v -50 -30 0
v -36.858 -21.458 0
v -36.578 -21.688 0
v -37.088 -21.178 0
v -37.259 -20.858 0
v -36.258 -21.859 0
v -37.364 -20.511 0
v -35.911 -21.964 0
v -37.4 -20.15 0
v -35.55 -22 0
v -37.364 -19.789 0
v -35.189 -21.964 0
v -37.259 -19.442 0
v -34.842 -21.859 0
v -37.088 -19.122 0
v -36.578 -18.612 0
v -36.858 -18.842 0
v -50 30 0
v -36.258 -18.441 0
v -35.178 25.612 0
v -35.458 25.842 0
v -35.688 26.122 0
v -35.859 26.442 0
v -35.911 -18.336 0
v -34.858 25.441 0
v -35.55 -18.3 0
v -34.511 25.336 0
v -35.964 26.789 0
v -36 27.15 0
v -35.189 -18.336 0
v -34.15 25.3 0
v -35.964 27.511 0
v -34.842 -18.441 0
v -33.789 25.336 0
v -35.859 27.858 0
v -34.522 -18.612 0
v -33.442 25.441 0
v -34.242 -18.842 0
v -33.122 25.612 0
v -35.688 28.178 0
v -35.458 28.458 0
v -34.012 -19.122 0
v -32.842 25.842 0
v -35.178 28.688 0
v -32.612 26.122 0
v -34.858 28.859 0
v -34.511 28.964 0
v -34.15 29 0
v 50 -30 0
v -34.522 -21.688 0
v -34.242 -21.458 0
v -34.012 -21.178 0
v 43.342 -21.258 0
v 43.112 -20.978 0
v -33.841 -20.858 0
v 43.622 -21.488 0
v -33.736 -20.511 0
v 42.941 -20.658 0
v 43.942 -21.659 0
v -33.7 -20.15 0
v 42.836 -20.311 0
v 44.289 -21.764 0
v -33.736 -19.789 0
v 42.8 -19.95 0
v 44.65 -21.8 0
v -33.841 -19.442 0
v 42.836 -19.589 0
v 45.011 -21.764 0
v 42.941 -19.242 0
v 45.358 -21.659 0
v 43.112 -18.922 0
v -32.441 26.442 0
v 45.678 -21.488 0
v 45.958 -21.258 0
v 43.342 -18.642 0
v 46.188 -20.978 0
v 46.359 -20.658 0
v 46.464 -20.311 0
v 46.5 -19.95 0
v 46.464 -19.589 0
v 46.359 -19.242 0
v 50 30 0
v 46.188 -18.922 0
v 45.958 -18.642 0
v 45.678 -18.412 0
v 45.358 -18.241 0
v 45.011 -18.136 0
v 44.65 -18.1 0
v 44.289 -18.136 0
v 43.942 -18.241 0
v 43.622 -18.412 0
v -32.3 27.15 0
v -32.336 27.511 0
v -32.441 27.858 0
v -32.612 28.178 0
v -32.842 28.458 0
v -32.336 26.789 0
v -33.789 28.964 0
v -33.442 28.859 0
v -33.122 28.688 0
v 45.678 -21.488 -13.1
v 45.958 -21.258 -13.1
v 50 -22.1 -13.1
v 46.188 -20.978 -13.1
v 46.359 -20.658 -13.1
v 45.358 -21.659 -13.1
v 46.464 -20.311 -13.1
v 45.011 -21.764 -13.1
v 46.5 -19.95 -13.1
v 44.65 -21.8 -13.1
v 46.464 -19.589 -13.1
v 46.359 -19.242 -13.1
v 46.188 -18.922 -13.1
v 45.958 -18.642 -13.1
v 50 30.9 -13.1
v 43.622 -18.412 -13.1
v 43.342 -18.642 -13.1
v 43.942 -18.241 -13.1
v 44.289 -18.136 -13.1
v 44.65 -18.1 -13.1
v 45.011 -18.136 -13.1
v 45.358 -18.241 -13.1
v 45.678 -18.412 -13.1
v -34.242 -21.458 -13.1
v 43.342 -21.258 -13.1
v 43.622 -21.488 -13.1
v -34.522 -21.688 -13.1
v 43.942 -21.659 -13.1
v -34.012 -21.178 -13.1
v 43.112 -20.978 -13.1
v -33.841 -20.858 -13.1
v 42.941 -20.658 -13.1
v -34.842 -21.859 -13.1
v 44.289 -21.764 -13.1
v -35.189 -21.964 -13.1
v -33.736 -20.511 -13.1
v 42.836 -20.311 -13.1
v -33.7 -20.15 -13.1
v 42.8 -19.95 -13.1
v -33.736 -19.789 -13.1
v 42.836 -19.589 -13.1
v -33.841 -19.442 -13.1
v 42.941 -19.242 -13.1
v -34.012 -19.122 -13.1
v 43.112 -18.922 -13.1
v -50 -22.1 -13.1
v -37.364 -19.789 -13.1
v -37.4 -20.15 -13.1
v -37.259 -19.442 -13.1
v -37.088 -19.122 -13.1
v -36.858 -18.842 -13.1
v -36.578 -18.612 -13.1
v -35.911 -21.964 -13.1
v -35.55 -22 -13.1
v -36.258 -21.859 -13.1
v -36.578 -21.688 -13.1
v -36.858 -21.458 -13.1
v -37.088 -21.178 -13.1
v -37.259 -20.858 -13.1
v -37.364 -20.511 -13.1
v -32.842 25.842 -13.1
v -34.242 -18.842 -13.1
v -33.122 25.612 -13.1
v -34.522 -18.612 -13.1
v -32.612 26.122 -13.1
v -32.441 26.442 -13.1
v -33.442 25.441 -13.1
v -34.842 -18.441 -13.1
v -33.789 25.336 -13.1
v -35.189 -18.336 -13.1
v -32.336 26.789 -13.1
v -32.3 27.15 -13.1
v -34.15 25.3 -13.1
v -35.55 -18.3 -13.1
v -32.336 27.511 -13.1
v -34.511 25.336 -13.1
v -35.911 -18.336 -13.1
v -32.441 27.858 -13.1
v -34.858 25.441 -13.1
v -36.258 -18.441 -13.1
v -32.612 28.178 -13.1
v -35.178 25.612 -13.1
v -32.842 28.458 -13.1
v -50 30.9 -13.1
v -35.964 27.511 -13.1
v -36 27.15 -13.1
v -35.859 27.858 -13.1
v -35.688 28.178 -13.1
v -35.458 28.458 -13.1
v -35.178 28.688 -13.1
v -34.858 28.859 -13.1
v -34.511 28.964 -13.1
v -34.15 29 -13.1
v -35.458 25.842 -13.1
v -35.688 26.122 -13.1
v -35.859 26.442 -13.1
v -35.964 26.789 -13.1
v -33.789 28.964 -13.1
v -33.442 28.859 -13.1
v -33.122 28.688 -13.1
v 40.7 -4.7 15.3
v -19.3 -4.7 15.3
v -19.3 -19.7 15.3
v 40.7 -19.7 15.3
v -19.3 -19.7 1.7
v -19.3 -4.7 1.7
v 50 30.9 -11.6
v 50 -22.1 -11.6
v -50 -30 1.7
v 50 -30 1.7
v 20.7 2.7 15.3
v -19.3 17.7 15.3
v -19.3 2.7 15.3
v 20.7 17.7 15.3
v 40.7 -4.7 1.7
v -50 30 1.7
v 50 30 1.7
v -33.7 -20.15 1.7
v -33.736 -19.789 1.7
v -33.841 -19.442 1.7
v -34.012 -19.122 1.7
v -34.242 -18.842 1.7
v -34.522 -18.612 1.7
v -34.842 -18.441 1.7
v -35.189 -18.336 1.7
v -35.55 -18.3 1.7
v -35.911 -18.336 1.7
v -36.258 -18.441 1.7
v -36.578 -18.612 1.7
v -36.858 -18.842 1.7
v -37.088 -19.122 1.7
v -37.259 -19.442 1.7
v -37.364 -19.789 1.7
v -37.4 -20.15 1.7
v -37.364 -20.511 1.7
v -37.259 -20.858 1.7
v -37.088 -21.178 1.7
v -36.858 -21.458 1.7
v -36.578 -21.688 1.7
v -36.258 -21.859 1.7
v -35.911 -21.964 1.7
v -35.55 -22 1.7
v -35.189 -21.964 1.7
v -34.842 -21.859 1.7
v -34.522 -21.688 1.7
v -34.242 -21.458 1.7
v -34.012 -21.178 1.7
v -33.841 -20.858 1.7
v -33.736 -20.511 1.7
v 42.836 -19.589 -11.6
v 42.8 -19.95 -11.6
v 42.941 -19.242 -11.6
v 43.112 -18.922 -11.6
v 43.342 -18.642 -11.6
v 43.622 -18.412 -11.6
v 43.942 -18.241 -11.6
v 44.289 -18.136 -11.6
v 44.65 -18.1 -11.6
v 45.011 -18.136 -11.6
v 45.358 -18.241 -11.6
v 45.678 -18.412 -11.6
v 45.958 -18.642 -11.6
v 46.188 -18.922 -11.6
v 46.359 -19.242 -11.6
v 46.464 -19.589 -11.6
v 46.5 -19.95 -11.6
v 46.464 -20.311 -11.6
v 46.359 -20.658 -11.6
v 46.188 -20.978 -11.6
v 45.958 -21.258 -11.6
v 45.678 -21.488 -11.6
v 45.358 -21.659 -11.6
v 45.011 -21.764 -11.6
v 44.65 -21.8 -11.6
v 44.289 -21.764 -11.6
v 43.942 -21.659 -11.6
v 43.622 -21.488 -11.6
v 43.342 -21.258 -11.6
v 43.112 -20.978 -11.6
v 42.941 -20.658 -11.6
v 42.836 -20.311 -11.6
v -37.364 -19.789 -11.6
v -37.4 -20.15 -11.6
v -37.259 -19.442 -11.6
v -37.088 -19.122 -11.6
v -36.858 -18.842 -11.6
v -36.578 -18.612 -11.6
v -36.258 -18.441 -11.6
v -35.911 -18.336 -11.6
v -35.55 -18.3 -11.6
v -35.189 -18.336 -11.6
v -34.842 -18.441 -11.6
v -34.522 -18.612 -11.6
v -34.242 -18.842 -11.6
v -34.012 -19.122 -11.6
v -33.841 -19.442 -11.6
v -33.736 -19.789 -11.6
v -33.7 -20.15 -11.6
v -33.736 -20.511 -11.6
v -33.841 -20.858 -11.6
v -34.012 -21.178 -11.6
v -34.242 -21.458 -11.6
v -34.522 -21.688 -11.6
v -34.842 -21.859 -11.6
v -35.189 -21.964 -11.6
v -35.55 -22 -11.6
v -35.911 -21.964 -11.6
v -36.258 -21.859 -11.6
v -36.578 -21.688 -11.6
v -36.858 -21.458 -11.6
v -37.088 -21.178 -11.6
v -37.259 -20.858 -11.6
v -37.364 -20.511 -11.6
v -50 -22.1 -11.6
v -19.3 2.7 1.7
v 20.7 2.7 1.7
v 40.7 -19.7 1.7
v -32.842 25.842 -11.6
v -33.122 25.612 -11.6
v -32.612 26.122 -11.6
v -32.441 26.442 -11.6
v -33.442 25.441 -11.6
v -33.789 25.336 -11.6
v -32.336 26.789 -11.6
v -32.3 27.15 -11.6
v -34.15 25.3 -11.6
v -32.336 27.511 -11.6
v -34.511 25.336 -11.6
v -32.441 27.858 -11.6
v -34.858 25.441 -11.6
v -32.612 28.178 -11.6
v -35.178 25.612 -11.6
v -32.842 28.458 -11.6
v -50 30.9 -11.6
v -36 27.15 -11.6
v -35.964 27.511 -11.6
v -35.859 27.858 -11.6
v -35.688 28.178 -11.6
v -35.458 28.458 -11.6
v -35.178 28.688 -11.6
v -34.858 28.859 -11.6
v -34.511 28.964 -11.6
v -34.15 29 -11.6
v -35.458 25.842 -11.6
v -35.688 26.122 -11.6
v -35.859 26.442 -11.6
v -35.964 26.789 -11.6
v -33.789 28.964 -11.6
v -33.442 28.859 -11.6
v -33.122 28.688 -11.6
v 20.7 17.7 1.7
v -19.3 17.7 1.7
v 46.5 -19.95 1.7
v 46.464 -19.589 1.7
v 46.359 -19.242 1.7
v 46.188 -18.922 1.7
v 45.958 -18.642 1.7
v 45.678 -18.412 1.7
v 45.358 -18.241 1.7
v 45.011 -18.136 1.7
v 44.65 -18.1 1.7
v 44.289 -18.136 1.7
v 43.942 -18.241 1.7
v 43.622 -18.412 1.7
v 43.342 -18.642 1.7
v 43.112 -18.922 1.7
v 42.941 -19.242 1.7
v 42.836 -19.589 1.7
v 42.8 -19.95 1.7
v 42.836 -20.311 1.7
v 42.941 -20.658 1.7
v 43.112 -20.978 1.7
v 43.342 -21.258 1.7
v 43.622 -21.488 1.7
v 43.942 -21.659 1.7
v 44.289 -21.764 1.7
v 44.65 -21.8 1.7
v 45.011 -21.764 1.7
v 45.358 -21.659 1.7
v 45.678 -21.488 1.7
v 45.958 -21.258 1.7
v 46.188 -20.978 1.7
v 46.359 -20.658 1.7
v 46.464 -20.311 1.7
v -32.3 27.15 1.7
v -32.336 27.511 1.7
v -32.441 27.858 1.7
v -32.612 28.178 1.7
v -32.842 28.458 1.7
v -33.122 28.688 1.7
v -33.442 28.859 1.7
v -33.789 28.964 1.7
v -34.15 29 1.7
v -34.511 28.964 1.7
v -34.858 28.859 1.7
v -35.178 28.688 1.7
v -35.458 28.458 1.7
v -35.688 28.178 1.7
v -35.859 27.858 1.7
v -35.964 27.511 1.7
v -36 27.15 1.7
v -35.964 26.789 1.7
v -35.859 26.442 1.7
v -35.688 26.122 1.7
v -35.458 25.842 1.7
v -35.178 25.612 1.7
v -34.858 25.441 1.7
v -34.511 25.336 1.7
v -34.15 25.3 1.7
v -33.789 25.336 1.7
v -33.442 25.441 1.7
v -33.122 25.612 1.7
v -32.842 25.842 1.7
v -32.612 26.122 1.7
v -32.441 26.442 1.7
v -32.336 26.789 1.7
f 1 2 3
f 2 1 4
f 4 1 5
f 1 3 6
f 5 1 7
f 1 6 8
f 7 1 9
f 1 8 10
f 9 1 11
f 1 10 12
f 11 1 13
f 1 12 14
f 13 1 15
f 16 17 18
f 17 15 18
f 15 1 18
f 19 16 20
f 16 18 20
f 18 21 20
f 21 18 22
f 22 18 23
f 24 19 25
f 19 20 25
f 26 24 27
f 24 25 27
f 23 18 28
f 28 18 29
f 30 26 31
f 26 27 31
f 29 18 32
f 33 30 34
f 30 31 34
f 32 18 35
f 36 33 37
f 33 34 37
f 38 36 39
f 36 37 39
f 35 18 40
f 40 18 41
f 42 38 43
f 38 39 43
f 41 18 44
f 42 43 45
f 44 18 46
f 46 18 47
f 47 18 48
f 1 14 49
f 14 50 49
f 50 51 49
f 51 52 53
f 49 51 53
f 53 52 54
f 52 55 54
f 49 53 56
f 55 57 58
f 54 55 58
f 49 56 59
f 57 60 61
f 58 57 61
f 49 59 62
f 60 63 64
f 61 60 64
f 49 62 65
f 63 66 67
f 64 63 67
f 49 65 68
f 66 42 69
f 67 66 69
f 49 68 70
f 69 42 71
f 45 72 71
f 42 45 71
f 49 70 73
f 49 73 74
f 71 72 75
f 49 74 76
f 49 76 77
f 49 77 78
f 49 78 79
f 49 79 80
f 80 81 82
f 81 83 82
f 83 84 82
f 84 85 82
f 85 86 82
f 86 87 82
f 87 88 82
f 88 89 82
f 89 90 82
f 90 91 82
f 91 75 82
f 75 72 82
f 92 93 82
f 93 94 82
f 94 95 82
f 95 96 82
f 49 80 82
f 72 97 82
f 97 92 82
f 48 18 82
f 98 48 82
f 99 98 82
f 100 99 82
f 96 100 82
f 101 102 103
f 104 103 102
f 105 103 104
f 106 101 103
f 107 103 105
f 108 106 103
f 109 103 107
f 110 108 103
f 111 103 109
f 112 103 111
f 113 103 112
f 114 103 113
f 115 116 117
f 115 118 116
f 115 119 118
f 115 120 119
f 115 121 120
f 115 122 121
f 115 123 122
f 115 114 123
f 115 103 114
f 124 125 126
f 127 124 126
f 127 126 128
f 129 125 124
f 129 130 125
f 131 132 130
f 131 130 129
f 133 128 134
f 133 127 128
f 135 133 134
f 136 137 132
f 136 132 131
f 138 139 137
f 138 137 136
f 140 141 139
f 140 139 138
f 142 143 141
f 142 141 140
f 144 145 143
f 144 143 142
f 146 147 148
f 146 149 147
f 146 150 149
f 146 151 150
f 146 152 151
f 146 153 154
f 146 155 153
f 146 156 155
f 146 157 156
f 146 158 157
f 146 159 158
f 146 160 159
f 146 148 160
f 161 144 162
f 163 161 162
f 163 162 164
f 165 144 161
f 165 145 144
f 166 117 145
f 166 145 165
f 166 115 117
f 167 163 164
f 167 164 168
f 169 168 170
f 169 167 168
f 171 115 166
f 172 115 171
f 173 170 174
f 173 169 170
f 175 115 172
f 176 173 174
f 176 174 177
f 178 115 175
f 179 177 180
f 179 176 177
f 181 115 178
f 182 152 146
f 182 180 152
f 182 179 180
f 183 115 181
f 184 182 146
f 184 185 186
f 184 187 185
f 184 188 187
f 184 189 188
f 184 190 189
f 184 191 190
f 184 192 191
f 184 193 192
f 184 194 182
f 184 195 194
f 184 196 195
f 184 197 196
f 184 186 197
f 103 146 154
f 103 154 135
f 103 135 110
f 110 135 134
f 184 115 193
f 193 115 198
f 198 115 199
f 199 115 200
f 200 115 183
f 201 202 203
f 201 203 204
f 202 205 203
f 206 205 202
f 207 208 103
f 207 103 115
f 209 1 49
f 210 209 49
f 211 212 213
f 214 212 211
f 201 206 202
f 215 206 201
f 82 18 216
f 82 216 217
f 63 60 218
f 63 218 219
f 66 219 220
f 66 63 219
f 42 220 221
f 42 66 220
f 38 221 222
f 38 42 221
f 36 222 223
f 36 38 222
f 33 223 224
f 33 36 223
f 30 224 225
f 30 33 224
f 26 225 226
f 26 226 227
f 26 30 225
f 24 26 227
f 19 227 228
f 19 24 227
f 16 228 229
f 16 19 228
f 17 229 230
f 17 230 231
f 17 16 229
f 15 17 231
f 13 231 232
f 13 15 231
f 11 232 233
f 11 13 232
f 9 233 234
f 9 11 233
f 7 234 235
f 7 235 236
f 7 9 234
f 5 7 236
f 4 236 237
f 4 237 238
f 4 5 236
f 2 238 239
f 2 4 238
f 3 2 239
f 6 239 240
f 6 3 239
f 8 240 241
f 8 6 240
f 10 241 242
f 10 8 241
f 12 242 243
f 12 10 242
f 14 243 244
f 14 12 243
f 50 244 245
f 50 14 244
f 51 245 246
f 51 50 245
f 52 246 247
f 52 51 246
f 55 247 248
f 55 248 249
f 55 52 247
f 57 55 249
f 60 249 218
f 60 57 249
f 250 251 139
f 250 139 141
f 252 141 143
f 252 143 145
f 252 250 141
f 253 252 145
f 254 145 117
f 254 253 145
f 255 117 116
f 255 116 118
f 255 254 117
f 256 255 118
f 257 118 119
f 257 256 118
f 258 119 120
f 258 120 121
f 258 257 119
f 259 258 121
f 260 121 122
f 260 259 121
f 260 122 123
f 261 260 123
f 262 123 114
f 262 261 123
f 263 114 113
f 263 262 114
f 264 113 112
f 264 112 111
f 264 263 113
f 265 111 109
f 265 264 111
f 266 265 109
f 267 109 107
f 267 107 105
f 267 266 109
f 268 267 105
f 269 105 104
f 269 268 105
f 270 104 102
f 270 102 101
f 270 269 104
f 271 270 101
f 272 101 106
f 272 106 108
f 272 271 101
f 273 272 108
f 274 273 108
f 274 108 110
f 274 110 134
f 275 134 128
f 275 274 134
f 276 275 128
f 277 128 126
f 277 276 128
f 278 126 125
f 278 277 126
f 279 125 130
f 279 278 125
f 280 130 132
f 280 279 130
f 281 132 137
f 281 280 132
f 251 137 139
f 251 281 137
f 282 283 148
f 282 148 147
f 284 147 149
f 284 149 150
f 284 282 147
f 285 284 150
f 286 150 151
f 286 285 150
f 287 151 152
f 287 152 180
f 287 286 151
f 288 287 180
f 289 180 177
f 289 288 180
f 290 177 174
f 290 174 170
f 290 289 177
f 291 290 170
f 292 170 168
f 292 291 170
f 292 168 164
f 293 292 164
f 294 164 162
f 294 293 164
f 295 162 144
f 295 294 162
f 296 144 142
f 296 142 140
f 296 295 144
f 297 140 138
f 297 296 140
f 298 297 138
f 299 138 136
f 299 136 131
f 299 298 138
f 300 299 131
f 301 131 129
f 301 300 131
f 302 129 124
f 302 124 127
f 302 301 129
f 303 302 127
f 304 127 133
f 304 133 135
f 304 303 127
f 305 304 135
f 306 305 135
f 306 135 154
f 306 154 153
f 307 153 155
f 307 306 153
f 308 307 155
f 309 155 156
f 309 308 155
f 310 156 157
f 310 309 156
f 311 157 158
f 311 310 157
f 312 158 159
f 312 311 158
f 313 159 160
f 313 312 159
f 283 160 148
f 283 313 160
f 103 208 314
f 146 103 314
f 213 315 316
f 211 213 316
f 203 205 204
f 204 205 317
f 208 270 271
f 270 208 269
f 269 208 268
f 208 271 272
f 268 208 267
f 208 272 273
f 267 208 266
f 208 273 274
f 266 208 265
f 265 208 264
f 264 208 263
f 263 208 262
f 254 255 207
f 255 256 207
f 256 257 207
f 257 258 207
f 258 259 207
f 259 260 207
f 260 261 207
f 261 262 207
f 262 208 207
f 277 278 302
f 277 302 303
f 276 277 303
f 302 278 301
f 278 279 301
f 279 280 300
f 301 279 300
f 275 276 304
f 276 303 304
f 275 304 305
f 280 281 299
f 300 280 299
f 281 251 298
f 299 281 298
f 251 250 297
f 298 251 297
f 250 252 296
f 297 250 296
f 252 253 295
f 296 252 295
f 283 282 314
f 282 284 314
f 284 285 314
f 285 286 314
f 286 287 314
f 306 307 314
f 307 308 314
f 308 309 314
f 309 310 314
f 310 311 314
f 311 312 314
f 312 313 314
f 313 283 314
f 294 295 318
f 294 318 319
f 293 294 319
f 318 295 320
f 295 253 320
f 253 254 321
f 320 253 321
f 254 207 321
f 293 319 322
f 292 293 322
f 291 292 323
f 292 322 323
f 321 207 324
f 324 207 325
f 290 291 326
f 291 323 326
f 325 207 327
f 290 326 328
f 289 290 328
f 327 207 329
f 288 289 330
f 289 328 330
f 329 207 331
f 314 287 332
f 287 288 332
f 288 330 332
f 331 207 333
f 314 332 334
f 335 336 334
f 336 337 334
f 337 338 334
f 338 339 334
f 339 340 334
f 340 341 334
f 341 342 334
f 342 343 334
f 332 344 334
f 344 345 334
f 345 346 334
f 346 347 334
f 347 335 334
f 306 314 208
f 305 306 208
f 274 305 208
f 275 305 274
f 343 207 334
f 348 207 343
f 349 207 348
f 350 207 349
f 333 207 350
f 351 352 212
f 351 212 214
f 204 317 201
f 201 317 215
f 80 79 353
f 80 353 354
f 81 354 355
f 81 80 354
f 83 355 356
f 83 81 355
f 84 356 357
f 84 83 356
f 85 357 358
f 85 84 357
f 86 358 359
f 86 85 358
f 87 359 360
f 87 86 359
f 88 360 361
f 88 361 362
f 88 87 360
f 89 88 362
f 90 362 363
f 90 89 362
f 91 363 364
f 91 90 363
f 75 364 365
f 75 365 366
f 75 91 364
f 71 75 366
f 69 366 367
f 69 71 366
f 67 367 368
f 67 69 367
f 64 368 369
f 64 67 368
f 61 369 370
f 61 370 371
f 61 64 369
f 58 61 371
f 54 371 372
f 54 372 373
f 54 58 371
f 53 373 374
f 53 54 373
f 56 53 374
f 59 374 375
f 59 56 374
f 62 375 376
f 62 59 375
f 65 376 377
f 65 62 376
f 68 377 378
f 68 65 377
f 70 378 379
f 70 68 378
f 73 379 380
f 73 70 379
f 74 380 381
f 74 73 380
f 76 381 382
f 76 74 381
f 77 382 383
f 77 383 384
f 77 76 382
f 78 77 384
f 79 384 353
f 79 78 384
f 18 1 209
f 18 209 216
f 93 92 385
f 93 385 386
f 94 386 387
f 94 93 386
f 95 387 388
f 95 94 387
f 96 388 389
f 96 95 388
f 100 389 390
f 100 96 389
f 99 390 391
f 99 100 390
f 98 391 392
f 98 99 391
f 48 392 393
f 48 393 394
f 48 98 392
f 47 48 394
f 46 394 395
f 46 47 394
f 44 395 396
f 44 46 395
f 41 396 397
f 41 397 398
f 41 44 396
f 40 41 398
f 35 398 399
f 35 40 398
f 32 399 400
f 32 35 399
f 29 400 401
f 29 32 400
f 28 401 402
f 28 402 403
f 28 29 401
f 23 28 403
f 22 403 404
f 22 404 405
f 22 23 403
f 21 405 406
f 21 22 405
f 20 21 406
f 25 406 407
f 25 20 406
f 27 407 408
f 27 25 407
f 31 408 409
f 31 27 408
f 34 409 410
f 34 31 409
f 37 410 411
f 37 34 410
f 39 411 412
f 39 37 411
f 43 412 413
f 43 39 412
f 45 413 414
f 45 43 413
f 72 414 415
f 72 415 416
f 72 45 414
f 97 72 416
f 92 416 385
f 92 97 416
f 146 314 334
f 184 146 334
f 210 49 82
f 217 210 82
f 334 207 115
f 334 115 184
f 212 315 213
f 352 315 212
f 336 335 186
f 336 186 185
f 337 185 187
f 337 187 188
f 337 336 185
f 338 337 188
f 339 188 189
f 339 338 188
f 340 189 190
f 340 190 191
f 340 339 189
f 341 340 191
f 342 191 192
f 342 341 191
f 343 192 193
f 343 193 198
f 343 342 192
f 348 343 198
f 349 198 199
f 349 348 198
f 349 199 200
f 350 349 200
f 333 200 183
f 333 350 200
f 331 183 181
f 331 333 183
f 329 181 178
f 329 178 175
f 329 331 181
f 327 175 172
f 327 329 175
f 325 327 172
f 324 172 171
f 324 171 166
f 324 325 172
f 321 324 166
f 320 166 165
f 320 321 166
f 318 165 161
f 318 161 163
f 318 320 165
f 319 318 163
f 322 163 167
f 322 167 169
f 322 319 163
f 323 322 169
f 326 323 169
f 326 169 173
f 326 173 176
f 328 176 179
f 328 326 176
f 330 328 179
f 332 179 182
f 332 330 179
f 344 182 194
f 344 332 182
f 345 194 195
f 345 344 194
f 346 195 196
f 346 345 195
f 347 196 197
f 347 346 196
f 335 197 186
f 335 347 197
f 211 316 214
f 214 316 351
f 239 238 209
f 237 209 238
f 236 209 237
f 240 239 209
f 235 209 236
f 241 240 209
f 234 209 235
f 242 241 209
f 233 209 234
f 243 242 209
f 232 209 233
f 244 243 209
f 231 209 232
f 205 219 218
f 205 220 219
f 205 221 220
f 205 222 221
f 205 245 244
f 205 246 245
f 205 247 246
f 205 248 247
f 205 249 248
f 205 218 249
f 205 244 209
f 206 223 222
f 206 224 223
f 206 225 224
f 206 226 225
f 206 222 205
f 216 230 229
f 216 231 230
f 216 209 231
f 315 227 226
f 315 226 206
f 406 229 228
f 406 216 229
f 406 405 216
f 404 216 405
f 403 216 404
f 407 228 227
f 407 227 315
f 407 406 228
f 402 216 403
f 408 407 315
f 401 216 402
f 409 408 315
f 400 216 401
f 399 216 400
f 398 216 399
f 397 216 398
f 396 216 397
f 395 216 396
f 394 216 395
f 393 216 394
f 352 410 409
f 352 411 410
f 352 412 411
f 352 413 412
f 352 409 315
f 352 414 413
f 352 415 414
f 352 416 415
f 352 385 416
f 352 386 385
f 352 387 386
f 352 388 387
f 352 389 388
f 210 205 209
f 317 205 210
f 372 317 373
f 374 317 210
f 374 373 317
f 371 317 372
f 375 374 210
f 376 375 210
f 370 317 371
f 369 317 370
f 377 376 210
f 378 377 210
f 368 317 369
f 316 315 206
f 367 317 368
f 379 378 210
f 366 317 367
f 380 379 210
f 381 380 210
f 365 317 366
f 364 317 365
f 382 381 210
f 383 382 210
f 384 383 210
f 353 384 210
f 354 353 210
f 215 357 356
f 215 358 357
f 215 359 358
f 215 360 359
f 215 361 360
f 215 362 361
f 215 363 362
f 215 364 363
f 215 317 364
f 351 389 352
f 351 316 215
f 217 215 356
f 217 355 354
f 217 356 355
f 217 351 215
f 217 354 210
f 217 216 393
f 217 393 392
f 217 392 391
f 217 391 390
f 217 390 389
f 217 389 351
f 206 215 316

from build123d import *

# Parameters (mm, degrees)
ESBO_O1_W                = 100
ESBO_O1_H                = 60
ESBO_O1_R                = 1.85
RESSALTO_EXTRUS_O1_DEPTH = 1.7
ESBO_O2_W                = 60
ESBO_O2_H                = 15
ESBO_O2_W_2              = 40
RESSALTO_EXTRUS_O2_DEPTH = 13.6
RESSALTO_EXTRUS_O6_START = 11.6
ESBO_O3_W                = 100
ESBO_O3_H                = 53
ESBO_O3_R                = 1.85
RESSALTO_EXTRUS_O6_DEPTH = 1.5


with BuildPart() as part:
    # Esboço1 → Ressalto-extrusão1 (new body)
    with BuildSketch(Plane.XY):
        Rectangle(ESBO_O1_W, ESBO_O1_H)
        with Locations((-34.15, 27.15)):
            Circle(ESBO_O1_R, mode=Mode.SUBTRACT)
        with Locations((-35.55, -20.15)):
            Circle(ESBO_O1_R, mode=Mode.SUBTRACT)
        with Locations((44.65, -19.95)):
            Circle(ESBO_O1_R, mode=Mode.SUBTRACT)
    extrude(amount=RESSALTO_EXTRUS_O1_DEPTH)

    # Esboço2 → Ressalto-extrusão2 (add)
    with BuildSketch(Plane.XY.offset(1.7)):
        with Locations((10.7, -12.2)):
            Rectangle(ESBO_O2_W, ESBO_O2_H)
        with Locations((0.7, 10.2)):
            Rectangle(ESBO_O2_W_2, ESBO_O2_H)
    extrude(amount=RESSALTO_EXTRUS_O2_DEPTH)


with BuildPart() as body_2:
    # Esboço3 → Ressalto-extrusão6 (new body)
    with BuildSketch(Plane(origin=(0, 0, 0), x_dir=(-1, 0, 0), z_dir=(0, 0, -1)).offset(RESSALTO_EXTRUS_O6_START)):
        with Locations((0, 4.4)):
            Rectangle(ESBO_O3_W, ESBO_O3_H)
        with Locations((-44.65, -19.95)):
            Circle(ESBO_O3_R, mode=Mode.SUBTRACT)
        with Locations((34.15, 27.15)):
            Circle(ESBO_O3_R, mode=Mode.SUBTRACT)
        with Locations((35.55, -20.15)):
            Circle(ESBO_O3_R, mode=Mode.SUBTRACT)
    extrude(amount=RESSALTO_EXTRUS_O6_DEPTH)


solid = Compound([part.part, body_2.part])
